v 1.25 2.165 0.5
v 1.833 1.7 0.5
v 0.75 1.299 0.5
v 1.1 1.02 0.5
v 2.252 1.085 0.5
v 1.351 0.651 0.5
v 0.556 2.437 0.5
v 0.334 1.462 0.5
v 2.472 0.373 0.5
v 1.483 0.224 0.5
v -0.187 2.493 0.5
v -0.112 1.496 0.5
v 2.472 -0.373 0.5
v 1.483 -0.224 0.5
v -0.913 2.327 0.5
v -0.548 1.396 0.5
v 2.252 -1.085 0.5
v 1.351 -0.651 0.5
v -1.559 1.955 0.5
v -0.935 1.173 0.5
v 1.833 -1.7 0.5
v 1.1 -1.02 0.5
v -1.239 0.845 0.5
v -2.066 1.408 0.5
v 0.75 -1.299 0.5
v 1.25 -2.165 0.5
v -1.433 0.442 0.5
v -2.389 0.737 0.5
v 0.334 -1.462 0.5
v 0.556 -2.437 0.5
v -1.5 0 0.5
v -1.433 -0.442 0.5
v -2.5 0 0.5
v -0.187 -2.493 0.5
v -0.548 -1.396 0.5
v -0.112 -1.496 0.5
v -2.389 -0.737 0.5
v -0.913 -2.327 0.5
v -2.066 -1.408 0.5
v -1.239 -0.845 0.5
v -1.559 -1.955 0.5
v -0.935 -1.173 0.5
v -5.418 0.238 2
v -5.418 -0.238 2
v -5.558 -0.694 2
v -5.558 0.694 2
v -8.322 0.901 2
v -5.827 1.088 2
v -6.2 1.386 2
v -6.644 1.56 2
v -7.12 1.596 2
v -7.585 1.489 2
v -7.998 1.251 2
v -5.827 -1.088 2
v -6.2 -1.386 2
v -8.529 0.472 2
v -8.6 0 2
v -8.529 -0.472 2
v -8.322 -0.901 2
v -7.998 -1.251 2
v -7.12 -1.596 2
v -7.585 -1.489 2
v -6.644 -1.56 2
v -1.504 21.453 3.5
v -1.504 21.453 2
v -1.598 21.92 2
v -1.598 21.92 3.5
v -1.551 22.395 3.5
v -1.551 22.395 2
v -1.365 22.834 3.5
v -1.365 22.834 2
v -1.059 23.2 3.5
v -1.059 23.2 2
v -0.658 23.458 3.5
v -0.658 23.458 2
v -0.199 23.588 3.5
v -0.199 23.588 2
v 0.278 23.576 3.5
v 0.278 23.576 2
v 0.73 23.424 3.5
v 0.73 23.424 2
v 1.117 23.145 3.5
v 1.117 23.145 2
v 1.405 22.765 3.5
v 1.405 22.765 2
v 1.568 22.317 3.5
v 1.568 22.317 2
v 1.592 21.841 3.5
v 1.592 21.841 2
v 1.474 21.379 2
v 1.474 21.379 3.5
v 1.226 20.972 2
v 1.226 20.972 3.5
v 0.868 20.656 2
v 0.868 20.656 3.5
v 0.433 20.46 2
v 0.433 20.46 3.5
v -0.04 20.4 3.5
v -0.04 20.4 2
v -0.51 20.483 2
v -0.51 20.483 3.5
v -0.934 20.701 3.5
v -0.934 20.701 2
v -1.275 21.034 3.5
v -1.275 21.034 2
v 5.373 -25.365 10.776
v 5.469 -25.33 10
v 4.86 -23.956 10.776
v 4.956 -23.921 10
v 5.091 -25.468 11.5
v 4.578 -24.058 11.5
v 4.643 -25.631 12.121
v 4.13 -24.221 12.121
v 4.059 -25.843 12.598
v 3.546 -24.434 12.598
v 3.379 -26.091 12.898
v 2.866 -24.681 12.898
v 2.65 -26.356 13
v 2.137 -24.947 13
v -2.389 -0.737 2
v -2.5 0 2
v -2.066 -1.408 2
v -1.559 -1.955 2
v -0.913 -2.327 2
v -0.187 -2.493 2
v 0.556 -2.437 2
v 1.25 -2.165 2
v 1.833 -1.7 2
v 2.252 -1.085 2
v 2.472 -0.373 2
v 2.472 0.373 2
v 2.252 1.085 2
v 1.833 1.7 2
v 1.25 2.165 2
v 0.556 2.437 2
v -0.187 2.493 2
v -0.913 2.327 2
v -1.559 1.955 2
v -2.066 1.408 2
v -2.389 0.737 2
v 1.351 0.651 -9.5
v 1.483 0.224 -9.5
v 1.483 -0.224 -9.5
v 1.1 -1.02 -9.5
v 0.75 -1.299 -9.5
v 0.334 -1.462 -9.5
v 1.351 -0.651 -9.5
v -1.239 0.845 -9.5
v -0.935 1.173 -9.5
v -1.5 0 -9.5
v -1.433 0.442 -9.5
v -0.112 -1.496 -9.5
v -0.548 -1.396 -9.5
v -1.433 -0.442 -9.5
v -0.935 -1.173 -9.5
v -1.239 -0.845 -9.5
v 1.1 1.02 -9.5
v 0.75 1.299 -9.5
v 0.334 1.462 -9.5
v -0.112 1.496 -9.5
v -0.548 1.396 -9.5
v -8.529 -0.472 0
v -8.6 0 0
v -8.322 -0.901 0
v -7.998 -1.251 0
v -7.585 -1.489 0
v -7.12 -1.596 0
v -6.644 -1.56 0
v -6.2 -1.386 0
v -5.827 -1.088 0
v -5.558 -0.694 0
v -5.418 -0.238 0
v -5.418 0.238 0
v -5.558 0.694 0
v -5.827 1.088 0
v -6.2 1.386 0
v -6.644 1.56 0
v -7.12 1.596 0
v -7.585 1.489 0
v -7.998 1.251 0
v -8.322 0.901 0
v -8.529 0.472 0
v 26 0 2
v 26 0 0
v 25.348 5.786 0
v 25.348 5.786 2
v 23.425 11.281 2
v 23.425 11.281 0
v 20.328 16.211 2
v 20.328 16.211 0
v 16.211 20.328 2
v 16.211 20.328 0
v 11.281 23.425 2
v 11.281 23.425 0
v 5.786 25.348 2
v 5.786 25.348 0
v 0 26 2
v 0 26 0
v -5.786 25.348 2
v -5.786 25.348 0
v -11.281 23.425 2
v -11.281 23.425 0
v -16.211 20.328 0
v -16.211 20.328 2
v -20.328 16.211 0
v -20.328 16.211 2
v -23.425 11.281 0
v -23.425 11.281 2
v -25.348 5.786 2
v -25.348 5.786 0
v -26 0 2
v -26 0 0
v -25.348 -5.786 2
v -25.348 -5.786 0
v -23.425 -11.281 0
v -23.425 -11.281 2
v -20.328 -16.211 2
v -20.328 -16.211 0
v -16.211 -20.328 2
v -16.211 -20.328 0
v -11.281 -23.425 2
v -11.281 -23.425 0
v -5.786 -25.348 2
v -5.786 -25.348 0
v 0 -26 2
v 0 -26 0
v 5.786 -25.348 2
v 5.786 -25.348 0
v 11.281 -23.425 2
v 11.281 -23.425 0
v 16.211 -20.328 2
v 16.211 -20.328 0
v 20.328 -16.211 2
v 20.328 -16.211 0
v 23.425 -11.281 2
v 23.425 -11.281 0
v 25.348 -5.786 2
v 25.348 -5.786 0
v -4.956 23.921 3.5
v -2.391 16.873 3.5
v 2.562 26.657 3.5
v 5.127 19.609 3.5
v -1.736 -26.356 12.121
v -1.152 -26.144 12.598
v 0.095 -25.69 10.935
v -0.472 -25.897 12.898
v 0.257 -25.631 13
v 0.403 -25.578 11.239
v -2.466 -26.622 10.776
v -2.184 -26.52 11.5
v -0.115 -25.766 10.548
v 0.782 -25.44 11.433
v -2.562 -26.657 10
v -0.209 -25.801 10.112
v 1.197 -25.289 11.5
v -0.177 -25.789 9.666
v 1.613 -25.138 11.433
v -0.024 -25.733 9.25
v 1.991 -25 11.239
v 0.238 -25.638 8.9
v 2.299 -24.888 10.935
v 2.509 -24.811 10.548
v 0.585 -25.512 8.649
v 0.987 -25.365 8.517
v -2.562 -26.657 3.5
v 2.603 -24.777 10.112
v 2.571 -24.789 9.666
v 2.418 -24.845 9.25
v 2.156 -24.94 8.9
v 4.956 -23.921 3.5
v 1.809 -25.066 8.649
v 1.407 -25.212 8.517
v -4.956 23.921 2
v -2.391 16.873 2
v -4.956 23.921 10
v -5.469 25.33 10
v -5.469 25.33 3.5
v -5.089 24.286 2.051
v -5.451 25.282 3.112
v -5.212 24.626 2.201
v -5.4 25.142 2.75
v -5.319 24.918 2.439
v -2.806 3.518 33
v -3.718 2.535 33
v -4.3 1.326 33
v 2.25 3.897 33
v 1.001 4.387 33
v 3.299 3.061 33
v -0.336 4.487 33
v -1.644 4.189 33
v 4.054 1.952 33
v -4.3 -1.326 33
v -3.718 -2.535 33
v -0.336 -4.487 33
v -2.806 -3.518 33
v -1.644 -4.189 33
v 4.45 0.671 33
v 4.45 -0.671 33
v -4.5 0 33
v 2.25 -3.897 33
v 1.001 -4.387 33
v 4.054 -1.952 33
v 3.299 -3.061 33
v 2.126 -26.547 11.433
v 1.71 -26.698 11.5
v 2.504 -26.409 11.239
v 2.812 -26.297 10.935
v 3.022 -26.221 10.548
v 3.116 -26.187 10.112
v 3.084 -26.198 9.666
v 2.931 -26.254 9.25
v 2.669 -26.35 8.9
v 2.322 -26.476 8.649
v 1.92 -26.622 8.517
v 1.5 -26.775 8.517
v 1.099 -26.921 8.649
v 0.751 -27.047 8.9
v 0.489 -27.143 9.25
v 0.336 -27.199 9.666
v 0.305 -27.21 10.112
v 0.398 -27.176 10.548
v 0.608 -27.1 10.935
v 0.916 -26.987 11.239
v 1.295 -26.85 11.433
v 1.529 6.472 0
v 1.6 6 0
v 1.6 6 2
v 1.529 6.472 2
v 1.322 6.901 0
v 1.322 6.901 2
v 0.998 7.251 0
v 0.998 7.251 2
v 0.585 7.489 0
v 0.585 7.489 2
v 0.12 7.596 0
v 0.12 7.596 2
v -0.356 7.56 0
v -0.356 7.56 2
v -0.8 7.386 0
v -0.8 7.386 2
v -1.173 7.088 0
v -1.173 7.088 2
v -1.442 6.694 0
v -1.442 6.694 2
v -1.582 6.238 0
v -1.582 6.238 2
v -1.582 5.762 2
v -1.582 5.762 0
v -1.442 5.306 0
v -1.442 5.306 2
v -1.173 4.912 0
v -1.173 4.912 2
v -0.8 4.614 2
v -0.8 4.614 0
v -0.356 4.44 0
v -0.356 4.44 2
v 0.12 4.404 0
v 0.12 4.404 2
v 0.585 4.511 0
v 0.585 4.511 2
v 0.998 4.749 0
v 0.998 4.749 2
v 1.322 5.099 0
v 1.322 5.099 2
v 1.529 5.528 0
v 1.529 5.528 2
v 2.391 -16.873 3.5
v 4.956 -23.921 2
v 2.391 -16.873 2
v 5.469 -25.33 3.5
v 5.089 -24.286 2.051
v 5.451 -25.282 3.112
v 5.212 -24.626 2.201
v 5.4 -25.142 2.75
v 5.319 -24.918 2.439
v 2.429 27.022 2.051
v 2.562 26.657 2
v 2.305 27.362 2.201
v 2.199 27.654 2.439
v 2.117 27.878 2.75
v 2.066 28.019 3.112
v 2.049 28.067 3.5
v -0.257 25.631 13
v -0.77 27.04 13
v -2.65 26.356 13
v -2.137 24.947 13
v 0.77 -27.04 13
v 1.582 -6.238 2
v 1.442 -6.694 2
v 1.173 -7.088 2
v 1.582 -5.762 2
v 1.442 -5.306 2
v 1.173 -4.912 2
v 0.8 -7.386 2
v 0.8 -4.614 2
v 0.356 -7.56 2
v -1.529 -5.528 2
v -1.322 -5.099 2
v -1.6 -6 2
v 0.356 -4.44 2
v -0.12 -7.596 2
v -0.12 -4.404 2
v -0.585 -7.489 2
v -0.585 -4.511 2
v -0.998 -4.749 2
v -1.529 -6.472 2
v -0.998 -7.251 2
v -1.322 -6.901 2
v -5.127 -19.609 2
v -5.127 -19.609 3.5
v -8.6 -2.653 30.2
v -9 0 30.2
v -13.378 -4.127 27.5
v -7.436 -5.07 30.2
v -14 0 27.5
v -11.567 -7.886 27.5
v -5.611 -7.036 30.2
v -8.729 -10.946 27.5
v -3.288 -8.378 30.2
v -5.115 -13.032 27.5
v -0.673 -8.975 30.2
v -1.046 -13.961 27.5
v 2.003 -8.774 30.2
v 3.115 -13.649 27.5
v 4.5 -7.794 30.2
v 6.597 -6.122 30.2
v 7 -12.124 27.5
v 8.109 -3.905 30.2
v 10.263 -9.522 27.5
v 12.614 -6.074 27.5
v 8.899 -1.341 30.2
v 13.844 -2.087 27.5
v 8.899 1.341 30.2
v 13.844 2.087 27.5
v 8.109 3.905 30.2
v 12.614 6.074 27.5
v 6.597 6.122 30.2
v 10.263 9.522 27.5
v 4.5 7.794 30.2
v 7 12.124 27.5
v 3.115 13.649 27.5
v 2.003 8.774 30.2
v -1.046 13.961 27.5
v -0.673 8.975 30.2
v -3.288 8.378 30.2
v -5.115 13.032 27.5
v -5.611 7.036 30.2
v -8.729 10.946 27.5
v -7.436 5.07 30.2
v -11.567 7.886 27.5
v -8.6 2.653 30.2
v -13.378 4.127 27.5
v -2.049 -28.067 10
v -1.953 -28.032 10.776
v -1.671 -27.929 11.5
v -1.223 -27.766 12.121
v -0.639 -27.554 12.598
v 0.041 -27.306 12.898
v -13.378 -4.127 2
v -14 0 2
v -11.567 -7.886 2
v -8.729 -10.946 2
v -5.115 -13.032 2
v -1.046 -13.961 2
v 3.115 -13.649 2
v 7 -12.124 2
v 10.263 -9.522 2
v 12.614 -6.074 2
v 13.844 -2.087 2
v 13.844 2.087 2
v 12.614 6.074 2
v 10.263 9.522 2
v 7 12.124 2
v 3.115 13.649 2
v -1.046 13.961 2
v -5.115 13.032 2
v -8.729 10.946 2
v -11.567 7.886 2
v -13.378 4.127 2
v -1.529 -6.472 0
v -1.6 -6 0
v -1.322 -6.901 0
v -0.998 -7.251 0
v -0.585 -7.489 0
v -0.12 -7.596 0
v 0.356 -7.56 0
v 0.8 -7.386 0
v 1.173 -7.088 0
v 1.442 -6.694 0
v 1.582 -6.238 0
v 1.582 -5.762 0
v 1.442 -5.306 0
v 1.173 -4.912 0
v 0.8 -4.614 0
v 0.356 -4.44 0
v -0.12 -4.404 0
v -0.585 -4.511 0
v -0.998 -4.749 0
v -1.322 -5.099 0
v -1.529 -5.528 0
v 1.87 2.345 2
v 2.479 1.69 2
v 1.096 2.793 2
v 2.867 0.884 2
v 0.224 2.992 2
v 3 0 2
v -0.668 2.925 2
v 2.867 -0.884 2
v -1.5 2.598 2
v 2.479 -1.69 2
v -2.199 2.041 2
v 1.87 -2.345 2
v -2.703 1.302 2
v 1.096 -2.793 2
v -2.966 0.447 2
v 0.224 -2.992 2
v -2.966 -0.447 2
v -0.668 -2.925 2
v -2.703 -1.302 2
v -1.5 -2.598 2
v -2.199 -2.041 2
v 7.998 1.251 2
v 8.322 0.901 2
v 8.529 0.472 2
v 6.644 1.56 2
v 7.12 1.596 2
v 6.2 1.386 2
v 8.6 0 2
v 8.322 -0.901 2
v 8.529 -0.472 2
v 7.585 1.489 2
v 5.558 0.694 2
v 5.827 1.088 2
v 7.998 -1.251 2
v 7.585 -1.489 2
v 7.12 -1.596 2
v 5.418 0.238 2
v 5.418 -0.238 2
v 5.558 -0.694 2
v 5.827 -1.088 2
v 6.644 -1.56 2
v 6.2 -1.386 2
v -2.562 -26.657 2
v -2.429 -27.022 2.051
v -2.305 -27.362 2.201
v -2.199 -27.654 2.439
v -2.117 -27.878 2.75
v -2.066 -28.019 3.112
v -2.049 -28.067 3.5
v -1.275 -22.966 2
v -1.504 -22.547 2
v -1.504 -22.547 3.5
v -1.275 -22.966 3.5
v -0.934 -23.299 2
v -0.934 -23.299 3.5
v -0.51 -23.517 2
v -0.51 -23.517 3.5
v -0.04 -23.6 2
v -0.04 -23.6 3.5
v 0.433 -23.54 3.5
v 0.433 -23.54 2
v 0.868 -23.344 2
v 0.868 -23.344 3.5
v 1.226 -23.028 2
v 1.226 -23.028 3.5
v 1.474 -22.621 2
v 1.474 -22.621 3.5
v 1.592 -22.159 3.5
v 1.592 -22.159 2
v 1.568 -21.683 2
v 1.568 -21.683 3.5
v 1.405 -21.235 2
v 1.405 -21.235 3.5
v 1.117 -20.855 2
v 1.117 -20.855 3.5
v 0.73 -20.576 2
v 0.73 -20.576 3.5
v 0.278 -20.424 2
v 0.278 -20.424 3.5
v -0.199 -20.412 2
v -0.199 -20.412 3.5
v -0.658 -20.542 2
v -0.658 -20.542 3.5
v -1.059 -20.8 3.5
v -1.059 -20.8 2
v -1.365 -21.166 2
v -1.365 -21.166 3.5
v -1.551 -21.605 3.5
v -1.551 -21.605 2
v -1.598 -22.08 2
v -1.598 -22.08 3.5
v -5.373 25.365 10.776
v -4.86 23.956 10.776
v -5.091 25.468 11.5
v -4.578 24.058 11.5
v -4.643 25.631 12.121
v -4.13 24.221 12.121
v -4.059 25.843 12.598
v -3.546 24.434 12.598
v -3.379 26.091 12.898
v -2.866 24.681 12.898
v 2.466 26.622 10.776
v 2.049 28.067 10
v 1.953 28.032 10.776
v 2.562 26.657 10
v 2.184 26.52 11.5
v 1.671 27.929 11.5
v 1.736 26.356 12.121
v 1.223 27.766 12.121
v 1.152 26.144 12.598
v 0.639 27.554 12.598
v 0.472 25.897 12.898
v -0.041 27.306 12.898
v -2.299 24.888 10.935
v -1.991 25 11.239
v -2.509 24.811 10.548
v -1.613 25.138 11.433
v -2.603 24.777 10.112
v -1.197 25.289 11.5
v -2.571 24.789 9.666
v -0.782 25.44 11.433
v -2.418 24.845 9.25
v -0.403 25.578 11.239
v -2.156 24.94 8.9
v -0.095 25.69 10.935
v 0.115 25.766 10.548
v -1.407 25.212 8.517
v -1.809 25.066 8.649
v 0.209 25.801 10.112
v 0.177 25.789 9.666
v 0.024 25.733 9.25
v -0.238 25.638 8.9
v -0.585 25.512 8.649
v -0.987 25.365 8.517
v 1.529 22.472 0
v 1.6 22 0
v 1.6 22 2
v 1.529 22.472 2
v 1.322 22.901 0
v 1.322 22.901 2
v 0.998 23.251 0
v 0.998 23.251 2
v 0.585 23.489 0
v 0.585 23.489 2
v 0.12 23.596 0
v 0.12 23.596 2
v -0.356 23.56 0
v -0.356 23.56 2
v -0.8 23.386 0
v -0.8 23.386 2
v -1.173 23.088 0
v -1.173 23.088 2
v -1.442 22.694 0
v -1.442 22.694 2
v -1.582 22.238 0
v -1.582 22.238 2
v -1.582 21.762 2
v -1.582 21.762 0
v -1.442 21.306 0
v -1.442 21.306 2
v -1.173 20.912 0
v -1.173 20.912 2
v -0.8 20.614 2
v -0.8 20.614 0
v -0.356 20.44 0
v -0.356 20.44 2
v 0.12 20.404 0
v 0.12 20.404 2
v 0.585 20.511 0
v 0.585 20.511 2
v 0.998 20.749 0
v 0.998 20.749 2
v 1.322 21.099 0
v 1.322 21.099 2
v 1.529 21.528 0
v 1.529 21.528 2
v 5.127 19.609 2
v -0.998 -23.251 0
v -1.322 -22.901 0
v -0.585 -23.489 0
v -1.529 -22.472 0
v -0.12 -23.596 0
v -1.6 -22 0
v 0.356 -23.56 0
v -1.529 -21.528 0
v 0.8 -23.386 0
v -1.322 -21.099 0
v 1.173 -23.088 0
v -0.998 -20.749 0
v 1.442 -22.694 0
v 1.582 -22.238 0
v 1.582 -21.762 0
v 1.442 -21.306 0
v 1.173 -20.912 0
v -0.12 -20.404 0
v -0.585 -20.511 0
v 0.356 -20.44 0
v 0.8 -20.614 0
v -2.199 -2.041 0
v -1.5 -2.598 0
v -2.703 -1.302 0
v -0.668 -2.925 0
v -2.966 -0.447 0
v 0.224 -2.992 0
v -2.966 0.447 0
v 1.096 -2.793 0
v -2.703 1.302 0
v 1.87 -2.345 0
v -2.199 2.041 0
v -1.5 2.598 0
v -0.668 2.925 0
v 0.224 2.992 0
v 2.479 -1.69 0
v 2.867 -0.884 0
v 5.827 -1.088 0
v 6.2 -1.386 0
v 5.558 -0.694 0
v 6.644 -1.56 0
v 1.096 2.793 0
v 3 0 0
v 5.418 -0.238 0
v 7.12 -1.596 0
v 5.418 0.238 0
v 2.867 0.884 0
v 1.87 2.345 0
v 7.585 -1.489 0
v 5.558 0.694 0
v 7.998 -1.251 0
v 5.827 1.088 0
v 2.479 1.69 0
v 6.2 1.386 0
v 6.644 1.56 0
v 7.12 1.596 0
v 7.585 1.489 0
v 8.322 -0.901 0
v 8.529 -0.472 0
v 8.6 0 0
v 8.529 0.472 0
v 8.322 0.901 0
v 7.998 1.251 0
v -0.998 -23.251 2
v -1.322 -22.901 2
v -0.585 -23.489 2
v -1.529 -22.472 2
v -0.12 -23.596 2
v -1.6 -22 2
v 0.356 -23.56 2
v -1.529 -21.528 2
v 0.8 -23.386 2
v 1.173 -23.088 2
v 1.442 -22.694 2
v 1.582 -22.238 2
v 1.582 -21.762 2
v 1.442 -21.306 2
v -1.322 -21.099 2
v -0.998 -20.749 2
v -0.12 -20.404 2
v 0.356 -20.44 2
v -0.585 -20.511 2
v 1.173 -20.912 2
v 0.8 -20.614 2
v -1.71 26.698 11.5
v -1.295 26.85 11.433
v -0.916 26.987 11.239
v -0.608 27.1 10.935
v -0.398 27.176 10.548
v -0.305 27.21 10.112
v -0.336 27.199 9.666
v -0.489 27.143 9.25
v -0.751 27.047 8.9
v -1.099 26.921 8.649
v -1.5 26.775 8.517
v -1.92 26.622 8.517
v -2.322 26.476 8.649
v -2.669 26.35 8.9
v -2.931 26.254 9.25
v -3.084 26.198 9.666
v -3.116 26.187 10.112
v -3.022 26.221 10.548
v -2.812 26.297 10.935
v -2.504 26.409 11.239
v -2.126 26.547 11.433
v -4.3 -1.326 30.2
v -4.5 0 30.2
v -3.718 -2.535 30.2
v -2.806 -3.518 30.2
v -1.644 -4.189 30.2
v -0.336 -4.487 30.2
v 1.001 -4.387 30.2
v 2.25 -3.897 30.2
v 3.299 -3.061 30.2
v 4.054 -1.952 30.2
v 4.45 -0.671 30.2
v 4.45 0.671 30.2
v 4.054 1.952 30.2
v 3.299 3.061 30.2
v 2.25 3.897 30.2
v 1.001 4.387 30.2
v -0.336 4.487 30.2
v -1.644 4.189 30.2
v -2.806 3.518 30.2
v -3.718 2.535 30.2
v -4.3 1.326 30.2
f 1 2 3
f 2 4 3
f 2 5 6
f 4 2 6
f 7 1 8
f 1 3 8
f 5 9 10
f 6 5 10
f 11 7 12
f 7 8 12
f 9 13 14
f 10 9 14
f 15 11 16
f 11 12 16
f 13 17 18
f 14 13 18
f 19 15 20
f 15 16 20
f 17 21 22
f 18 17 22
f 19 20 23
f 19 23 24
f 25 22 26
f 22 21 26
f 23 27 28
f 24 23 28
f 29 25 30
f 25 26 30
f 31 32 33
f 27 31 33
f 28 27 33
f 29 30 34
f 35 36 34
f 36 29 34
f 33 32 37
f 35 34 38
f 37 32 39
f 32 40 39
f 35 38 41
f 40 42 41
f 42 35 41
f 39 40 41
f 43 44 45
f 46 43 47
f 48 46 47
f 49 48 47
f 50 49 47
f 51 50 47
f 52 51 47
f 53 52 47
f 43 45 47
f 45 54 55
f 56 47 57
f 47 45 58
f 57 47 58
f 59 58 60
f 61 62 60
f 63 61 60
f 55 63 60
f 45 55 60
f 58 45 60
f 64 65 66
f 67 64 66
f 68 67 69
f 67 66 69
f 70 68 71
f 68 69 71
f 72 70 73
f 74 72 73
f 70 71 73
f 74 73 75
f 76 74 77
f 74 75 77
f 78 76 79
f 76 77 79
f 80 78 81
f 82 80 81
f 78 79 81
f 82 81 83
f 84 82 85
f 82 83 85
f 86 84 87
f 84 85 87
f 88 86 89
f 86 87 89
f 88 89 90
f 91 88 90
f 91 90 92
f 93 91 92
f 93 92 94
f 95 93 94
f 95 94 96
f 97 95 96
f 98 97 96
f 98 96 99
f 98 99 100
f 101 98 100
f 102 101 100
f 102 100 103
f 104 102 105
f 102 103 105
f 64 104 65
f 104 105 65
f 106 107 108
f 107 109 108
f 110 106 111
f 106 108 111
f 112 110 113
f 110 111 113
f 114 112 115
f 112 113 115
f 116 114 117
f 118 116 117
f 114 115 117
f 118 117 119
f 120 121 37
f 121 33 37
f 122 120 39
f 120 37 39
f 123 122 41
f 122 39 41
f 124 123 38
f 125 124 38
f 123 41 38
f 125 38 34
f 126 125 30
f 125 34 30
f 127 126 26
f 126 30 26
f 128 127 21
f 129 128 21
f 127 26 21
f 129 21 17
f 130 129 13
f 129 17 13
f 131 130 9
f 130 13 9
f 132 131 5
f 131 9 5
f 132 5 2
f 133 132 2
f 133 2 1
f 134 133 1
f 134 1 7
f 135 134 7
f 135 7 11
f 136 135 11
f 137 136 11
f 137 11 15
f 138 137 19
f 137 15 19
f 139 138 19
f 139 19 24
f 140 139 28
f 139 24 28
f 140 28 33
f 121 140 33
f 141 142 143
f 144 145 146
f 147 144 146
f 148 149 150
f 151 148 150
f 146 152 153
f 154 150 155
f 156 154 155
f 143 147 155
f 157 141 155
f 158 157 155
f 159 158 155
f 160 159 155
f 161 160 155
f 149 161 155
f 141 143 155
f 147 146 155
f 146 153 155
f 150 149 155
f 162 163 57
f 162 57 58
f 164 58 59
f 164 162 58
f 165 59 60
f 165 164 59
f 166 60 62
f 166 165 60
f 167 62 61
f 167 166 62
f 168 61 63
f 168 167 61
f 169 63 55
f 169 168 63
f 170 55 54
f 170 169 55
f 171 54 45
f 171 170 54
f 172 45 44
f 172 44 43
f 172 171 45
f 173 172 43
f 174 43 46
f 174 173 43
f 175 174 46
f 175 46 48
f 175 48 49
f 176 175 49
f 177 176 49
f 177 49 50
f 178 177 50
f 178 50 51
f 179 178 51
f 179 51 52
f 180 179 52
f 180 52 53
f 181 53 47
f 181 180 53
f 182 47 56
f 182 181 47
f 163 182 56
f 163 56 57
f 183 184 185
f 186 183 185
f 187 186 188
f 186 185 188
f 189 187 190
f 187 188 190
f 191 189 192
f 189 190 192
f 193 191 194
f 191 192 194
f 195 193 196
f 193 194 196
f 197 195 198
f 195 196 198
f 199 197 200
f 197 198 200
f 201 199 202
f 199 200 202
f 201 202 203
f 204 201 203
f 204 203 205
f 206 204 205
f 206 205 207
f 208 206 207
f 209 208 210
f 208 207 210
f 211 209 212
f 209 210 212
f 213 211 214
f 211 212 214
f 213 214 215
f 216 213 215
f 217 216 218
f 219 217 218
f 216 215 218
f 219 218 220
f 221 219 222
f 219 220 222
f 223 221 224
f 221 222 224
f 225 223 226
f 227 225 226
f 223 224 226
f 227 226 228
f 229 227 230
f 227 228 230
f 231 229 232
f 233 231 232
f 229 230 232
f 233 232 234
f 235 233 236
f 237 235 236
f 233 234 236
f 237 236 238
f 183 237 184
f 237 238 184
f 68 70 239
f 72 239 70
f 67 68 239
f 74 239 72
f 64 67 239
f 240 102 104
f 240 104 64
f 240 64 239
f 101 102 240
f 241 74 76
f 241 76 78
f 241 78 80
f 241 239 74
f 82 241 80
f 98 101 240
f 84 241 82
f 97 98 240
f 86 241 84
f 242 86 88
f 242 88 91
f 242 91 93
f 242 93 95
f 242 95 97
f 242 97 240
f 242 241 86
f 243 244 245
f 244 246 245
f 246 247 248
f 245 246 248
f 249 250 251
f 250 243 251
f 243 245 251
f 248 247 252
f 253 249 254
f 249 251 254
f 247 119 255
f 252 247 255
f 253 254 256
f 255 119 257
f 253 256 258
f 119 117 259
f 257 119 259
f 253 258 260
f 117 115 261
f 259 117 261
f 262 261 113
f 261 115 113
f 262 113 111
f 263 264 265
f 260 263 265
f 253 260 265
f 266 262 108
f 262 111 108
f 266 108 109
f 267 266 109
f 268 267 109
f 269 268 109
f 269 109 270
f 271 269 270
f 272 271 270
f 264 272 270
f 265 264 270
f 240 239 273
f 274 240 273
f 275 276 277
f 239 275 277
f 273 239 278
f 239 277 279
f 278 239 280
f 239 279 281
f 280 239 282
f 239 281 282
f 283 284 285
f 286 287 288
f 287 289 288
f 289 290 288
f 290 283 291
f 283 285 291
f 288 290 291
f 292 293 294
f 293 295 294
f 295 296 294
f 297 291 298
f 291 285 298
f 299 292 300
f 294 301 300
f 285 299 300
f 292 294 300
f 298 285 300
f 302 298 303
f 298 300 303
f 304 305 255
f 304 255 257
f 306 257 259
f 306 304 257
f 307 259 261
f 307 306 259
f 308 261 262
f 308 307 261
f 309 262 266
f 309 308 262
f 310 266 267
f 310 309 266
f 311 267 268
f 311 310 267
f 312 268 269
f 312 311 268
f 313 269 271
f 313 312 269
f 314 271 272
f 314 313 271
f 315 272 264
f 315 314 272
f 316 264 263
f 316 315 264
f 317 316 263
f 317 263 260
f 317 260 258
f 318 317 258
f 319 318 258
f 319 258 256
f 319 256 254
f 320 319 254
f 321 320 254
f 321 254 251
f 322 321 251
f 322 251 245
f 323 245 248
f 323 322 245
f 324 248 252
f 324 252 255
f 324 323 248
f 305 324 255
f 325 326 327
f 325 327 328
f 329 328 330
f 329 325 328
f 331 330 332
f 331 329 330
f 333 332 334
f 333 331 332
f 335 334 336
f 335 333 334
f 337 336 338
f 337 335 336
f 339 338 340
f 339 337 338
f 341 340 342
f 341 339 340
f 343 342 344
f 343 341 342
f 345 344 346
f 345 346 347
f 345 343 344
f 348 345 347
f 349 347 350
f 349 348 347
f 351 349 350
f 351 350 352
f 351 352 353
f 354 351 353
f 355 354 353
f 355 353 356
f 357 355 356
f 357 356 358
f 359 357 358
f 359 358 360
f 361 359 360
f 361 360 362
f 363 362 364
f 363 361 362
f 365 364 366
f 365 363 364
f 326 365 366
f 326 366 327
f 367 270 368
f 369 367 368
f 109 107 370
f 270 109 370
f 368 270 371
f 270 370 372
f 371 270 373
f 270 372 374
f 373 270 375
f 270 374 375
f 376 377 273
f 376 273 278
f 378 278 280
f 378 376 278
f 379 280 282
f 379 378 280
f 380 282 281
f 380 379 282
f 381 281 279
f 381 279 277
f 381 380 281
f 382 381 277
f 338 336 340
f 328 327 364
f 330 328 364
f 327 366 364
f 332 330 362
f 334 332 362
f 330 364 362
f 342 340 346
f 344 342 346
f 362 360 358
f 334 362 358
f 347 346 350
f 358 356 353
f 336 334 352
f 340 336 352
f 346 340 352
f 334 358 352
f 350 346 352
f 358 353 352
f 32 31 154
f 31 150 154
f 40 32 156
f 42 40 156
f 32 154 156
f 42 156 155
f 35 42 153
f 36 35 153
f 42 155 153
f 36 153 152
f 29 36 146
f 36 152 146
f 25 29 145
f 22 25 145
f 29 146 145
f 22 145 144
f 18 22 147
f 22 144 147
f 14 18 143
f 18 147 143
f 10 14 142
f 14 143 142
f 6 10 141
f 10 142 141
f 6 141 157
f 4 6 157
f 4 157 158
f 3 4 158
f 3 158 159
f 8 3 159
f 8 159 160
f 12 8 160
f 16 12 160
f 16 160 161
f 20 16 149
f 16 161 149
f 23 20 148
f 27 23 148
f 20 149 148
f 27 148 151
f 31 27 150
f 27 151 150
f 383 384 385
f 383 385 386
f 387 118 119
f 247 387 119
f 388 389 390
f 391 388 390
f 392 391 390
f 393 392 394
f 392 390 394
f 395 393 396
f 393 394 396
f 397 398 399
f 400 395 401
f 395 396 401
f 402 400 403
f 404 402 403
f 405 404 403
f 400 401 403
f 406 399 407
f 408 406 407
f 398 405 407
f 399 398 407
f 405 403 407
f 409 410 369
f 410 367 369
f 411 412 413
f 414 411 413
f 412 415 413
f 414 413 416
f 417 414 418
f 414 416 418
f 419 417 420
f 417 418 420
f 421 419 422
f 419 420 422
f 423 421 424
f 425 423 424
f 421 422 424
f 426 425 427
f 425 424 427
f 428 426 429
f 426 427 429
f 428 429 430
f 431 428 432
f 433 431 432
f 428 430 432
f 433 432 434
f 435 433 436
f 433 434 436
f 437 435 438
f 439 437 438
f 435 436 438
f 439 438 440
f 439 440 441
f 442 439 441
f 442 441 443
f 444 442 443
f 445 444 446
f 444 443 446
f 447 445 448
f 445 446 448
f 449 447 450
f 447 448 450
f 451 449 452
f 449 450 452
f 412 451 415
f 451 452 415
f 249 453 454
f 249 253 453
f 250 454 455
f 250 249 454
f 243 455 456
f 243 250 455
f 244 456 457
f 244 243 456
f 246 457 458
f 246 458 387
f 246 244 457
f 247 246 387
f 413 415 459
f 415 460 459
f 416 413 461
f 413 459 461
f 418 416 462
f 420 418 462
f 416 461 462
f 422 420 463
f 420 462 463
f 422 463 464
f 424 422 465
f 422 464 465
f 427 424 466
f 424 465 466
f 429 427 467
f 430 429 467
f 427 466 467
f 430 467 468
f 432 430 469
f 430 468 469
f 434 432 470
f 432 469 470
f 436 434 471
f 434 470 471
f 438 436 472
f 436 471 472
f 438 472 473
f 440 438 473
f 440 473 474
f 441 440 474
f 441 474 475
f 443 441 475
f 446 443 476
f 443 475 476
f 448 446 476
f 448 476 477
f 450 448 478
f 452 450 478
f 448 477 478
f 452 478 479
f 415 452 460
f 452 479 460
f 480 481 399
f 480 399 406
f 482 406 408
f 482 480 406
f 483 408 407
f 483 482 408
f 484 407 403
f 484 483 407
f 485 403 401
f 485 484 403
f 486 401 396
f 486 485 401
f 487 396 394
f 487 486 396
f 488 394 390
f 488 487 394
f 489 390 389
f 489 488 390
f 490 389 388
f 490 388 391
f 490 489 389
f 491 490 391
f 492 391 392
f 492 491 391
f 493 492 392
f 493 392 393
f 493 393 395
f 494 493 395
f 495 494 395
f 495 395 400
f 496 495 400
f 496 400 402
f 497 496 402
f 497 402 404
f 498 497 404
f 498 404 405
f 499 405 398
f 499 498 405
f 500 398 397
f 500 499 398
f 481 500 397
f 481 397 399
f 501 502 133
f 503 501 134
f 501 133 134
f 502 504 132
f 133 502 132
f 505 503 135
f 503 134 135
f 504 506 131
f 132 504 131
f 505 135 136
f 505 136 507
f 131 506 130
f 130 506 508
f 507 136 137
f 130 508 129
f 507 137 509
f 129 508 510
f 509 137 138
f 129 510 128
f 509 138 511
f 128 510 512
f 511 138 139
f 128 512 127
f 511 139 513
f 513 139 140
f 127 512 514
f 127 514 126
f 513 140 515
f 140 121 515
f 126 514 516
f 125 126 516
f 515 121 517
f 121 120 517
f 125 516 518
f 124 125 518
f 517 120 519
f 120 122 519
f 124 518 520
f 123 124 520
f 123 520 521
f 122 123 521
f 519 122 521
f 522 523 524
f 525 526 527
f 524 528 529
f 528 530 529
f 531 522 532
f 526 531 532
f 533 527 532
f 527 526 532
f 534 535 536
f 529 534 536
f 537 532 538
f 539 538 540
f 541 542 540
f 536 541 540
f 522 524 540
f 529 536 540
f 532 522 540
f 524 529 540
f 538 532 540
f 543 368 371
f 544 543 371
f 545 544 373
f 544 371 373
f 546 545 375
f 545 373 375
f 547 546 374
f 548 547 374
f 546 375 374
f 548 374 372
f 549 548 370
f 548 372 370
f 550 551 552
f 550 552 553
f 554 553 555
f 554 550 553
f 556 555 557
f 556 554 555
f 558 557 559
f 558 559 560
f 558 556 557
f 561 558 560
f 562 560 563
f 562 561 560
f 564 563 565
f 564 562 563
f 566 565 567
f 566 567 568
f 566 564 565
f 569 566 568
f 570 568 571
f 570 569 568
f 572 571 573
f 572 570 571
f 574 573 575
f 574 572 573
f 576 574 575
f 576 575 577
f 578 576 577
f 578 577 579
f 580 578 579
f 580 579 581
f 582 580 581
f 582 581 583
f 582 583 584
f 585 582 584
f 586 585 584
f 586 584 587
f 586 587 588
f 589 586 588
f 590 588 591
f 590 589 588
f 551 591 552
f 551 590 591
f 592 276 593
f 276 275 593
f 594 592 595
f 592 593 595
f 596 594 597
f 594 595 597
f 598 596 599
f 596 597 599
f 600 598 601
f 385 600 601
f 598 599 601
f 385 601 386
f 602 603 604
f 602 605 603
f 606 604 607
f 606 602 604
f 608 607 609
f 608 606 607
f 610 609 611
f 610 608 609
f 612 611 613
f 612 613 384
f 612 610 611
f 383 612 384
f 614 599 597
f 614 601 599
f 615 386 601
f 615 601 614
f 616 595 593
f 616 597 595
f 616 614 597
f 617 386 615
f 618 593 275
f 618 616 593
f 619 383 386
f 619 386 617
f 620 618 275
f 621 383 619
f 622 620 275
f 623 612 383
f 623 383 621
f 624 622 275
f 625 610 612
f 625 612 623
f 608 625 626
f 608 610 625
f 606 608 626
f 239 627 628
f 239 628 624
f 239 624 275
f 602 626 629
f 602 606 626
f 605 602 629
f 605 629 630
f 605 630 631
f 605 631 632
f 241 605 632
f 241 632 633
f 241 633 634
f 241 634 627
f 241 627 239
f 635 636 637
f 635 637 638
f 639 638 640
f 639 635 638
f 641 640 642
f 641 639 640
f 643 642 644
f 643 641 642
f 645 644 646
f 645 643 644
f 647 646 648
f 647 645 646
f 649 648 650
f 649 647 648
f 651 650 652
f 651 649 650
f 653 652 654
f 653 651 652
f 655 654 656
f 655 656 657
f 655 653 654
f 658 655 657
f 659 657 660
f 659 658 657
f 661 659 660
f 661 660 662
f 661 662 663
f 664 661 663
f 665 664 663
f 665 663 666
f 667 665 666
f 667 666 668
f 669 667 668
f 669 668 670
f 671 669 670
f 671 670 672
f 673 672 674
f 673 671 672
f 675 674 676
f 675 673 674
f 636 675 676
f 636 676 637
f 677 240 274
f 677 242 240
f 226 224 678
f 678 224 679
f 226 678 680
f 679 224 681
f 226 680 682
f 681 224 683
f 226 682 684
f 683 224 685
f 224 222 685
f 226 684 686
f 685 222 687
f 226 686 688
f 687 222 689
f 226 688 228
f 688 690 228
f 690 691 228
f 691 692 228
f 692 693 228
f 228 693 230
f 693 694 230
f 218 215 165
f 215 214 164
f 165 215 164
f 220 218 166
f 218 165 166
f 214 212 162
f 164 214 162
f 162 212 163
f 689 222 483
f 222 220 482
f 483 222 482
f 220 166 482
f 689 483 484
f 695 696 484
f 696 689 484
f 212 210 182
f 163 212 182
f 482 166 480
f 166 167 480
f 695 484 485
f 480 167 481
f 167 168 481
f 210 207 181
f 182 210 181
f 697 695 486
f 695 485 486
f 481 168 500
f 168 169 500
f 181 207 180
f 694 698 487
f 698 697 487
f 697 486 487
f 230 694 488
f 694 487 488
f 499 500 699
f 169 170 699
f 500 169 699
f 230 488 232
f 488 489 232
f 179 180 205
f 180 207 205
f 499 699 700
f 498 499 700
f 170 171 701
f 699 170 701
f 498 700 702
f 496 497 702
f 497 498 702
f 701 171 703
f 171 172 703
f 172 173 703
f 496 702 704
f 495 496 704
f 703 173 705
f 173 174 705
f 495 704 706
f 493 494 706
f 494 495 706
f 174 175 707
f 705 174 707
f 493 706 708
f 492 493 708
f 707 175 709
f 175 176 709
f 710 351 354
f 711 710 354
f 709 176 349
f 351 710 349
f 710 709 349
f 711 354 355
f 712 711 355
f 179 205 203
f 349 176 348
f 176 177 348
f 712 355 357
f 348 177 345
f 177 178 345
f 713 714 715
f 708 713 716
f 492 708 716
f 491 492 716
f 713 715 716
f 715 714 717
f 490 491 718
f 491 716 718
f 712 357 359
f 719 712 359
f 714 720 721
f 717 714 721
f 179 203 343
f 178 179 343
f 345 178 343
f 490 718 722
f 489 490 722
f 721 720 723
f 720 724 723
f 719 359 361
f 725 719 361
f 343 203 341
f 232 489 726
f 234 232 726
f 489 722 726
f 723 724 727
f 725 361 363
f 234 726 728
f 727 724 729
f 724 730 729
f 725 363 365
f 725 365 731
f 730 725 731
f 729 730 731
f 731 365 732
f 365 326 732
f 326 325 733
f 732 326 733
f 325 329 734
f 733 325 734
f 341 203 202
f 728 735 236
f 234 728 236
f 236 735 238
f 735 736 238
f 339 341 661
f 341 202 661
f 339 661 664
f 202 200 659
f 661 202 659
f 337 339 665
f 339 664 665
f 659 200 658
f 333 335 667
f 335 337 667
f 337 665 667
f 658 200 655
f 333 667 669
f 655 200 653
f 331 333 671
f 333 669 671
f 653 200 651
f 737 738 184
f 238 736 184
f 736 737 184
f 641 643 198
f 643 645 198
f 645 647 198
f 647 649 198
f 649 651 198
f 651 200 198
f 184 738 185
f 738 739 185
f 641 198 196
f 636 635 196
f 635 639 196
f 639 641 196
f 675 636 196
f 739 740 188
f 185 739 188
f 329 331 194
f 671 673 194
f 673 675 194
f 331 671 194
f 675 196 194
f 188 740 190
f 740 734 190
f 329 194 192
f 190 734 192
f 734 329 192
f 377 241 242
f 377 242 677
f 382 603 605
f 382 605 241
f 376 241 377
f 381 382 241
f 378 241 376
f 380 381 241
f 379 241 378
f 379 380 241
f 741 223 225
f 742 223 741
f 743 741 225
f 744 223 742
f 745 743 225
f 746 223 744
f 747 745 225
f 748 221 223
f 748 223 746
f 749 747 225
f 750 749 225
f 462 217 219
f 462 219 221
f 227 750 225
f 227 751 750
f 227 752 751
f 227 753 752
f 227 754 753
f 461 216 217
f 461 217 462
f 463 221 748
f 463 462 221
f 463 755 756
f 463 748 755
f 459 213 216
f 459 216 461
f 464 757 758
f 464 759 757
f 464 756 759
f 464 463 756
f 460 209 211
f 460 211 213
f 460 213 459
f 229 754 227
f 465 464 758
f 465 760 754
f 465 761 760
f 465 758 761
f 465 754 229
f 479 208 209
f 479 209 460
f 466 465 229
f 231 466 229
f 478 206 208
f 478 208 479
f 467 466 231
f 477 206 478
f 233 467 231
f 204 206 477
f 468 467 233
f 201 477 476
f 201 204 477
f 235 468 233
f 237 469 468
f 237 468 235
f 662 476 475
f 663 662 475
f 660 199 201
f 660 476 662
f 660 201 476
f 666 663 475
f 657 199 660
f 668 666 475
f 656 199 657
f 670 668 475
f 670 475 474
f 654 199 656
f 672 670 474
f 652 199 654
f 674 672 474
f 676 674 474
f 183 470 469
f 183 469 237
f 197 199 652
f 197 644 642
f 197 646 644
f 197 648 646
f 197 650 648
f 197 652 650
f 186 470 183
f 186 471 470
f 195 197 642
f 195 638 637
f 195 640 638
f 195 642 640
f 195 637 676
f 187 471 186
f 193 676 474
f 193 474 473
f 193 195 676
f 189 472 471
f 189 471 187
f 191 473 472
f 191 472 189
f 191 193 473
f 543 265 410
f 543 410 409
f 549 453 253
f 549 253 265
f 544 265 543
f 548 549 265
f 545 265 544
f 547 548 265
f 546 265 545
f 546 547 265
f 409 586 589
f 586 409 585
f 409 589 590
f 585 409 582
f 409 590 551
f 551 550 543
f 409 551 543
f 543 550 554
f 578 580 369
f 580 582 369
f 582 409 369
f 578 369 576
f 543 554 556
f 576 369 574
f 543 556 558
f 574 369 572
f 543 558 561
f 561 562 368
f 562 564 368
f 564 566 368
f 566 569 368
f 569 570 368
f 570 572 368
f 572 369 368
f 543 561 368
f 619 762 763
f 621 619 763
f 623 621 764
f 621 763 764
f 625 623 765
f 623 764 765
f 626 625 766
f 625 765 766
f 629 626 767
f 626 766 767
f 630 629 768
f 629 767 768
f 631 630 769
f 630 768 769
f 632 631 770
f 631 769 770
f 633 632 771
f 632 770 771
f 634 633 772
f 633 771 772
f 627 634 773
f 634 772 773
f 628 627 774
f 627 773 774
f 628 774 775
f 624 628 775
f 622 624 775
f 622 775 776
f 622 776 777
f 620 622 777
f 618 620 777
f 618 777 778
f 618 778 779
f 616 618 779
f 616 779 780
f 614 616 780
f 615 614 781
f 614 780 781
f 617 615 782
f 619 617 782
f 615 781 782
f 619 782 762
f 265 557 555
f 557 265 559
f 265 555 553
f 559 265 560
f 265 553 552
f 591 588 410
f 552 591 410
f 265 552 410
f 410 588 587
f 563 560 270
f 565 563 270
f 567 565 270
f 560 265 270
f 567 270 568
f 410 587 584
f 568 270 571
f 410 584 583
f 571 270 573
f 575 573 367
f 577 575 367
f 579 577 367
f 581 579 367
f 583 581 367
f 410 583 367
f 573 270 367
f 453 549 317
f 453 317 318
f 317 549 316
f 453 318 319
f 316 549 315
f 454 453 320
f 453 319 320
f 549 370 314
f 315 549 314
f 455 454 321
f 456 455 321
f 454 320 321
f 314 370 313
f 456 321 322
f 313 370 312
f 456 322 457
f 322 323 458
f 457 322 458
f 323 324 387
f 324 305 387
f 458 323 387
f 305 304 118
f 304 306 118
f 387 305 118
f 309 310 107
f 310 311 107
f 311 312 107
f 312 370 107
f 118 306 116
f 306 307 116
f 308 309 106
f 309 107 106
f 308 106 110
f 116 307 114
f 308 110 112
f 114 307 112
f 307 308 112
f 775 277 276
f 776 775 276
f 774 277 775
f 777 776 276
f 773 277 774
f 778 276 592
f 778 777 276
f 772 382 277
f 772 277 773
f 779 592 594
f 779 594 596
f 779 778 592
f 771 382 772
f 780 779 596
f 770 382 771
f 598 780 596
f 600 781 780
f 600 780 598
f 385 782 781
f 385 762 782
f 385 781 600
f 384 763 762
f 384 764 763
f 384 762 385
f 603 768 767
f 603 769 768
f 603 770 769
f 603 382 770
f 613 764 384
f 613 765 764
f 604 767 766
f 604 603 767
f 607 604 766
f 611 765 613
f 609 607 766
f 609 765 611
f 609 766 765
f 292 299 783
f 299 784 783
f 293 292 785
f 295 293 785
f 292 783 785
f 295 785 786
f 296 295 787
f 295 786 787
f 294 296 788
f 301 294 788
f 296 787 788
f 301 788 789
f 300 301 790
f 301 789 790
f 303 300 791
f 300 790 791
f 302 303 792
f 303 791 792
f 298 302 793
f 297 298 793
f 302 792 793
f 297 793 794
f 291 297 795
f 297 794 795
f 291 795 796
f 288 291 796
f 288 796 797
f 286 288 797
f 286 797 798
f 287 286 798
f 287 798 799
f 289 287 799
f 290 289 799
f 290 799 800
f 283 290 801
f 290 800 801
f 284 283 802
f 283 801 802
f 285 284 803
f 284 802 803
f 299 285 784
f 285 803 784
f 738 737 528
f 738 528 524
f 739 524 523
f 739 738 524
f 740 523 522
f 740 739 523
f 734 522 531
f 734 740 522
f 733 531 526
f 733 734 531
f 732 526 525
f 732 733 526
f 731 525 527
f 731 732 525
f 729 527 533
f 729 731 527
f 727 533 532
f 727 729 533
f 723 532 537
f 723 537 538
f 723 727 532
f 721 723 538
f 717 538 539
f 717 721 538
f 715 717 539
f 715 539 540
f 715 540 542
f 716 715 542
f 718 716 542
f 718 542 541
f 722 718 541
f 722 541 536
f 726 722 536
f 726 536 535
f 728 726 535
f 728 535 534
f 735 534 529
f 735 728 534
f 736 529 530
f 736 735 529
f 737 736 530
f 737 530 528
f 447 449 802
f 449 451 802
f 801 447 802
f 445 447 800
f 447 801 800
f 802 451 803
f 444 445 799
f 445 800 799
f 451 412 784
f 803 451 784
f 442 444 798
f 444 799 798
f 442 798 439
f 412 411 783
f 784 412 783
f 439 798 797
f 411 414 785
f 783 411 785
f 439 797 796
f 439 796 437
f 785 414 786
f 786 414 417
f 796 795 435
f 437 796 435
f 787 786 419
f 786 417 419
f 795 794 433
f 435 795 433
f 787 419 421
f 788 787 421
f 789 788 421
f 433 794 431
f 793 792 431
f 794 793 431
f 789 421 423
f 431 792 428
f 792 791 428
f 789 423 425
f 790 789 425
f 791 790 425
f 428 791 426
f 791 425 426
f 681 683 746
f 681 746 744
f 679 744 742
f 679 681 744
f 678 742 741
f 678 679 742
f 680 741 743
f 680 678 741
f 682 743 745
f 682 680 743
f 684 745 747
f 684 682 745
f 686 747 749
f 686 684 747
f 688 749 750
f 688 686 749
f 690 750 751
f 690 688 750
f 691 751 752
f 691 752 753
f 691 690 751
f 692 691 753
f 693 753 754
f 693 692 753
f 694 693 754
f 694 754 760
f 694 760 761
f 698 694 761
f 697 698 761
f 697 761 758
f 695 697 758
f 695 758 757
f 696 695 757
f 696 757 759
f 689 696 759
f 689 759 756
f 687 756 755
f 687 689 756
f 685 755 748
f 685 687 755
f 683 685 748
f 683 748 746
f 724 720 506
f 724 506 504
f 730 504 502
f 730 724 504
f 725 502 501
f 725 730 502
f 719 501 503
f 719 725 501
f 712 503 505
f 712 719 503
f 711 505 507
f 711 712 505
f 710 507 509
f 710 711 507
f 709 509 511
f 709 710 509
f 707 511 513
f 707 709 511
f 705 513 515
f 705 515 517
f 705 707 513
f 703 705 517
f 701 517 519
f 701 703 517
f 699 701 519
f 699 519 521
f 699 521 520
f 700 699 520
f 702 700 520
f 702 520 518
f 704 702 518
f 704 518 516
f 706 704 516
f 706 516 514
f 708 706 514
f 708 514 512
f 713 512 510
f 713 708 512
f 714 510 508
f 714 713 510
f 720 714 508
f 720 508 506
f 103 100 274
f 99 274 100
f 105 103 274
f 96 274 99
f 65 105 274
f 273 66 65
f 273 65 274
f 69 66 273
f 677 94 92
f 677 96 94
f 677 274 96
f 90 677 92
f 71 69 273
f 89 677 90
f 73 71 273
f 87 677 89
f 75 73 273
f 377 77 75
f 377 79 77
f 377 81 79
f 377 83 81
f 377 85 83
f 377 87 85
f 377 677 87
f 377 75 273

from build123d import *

# Parameters (mm, degrees)
SKICA1_R                        = 26
SKICA1_R_2                      = 3
SKICA1_R_3                      = 1.6
P_IDAT_VYSUNUT_M1_DEPTH         = 2
VYSUNOUT_TENKOST_NN_1_DEPTH     = 4
SKICA4_R                        = 1.6
ODEBRAT_VYSUNUT_M1_DEPTH        = 1.5
SKICA5_R                        = 1.5
ODEBRAT_VYSUNUT_M2_DEPTH        = 1.5
ZAOBLIT1_R                      = 3
T_LO_P_ESUNOUT_KOP_ROVAT1_ANGLE = 20
T_LO_P_ESUNOUT_KOP_ROVAT2_ANGLE = 20


with BuildPart() as part:
    # Skica1 → Přidat vysunutím1 (new body)
    with BuildSketch(Plane.XY):
        Circle(SKICA1_R)
        Circle(SKICA1_R_2, mode=Mode.SUBTRACT)
        with Locations((7, 0)):
            Circle(SKICA1_R_3, mode=Mode.SUBTRACT)
        with Locations((0, 6)):
            Circle(SKICA1_R_3, mode=Mode.SUBTRACT)
        with Locations(Location((0, -6, 0), (0, 0, 180))):
            Circle(SKICA1_R_3, mode=Mode.SUBTRACT)
        with Locations(Location((-7, 0, 0), (0, 0, 180))):
            Circle(SKICA1_R_3, mode=Mode.SUBTRACT)
        with Locations((0, 22)):
            Circle(SKICA1_R_3, mode=Mode.SUBTRACT)
        with Locations(Location((0, -22, 0), (0, 0, 180))):
            Circle(SKICA1_R_3, mode=Mode.SUBTRACT)
    extrude(amount=P_IDAT_VYSUNUT_M1_DEPTH)

    # Skica2 → Rotovat1 (revolve)
    with BuildSketch(Plane(origin=(0, 0, 0), x_dir=(0, 0, -1), z_dir=(1, 0, 0)), mode=Mode.PRIVATE) as rotovat1_sk:
        Polygon((-33, 0), (-33, 4.5), (-30.2, 4.5), (-30.2, 9), (-27.5, 14), (-2, 14), (-2, 2.5), (-0.5, 2.5), (-0.5, 1.5), (9.5, 1.5), (9.5, 0), align=None)
    revolve(rotovat1_sk.sketch.rotate(Axis((0, 0, 0), (0, 0, 1)), 90), axis=Axis((0, 0, 0), (0, 0, 1)))


with BuildPart() as body_2:
    # Skica3 → Vysunout tenkostěnný1 (new, symmetric)
    with BuildSketch(Plane(origin=(0, 0, 0), x_dir=(0, 0, -1), z_dir=(1, 0, 0))):
        with BuildLine():
            Line((-2, 18), (-2, 25.5))
            ThreePointArc((-2, 25.5), (-2.439339828, 26.560660172), (-3.5, 27))
            Line((-3.5, 27), (-13, 27))
            Line((-13, 27), (-13, 25.5))
            Line((-13, 25.5), (-3.5, 25.5))
            Line((-3.5, 25.5), (-3.5, 18))
            Line((-3.5, 18), (-2, 18))
        make_face()
    extrude(amount=VYSUNOUT_TENKOST_NN_1_DEPTH, both=True)

    # Skica4 → Odebrat vysunutím1 (cut)
    with BuildSketch(Plane(origin=(0, 0, 2), x_dir=(-1, 0, 0), z_dir=(0, 0, -1))):
        with Locations((0, 22)):
            Circle(SKICA4_R)
    extrude(amount=-ODEBRAT_VYSUNUT_M1_DEPTH, mode=Mode.SUBTRACT)

    # Skica5 → Odebrat vysunutím2 (cut)
    with BuildSketch(Plane(origin=(0, 27, 0), x_dir=(1, 0, 0), z_dir=(0, 1, 0))):
        with Locations(Location((0, -10, 0), (0, 0, 270))):
            Circle(SKICA5_R)
    extrude(amount=-ODEBRAT_VYSUNUT_M2_DEPTH, mode=Mode.SUBTRACT)

    # Zaoblit1
    zaoblit1_edges = [body_2.edges().sort_by_distance(p)[0] for p in [
        (4, 26.25, 13),
        (-4, 26.25, 13),
    ]]
    fillet(zaoblit1_edges, radius=ZAOBLIT1_R)


with BuildPart() as body_3:
    # Zrcadlit1: mirrored copy
    add(body_2.part.mirror(Plane.ZX))


with BuildPart() as body_2_1:
    # Tělo-Přesunout/kopírovat1: read off the stored shape, not the designer's step
    # Tělo-Přesunout/kopírovat1: moved
    add(body_2.part.moved(Location((7.5244432, -1.3267623, 0))).rotate(Axis((0, 0, 0), (0, 0, 1)), T_LO_P_ESUNOUT_KOP_ROVAT1_ANGLE))


with BuildPart() as body_3_1:
    # Tělo-Přesunout/kopírovat2: read off the stored shape, not the designer's step
    # Tělo-Přesunout/kopírovat2: moved
    add(body_3.part.moved(Location((-7.5244432, 1.3267623, 0))).rotate(Axis((0, 0, 0), (0, 0, 1)), T_LO_P_ESUNOUT_KOP_ROVAT2_ANGLE))


solid = Compound([part.part, body_2_1.part, body_3_1.part])
